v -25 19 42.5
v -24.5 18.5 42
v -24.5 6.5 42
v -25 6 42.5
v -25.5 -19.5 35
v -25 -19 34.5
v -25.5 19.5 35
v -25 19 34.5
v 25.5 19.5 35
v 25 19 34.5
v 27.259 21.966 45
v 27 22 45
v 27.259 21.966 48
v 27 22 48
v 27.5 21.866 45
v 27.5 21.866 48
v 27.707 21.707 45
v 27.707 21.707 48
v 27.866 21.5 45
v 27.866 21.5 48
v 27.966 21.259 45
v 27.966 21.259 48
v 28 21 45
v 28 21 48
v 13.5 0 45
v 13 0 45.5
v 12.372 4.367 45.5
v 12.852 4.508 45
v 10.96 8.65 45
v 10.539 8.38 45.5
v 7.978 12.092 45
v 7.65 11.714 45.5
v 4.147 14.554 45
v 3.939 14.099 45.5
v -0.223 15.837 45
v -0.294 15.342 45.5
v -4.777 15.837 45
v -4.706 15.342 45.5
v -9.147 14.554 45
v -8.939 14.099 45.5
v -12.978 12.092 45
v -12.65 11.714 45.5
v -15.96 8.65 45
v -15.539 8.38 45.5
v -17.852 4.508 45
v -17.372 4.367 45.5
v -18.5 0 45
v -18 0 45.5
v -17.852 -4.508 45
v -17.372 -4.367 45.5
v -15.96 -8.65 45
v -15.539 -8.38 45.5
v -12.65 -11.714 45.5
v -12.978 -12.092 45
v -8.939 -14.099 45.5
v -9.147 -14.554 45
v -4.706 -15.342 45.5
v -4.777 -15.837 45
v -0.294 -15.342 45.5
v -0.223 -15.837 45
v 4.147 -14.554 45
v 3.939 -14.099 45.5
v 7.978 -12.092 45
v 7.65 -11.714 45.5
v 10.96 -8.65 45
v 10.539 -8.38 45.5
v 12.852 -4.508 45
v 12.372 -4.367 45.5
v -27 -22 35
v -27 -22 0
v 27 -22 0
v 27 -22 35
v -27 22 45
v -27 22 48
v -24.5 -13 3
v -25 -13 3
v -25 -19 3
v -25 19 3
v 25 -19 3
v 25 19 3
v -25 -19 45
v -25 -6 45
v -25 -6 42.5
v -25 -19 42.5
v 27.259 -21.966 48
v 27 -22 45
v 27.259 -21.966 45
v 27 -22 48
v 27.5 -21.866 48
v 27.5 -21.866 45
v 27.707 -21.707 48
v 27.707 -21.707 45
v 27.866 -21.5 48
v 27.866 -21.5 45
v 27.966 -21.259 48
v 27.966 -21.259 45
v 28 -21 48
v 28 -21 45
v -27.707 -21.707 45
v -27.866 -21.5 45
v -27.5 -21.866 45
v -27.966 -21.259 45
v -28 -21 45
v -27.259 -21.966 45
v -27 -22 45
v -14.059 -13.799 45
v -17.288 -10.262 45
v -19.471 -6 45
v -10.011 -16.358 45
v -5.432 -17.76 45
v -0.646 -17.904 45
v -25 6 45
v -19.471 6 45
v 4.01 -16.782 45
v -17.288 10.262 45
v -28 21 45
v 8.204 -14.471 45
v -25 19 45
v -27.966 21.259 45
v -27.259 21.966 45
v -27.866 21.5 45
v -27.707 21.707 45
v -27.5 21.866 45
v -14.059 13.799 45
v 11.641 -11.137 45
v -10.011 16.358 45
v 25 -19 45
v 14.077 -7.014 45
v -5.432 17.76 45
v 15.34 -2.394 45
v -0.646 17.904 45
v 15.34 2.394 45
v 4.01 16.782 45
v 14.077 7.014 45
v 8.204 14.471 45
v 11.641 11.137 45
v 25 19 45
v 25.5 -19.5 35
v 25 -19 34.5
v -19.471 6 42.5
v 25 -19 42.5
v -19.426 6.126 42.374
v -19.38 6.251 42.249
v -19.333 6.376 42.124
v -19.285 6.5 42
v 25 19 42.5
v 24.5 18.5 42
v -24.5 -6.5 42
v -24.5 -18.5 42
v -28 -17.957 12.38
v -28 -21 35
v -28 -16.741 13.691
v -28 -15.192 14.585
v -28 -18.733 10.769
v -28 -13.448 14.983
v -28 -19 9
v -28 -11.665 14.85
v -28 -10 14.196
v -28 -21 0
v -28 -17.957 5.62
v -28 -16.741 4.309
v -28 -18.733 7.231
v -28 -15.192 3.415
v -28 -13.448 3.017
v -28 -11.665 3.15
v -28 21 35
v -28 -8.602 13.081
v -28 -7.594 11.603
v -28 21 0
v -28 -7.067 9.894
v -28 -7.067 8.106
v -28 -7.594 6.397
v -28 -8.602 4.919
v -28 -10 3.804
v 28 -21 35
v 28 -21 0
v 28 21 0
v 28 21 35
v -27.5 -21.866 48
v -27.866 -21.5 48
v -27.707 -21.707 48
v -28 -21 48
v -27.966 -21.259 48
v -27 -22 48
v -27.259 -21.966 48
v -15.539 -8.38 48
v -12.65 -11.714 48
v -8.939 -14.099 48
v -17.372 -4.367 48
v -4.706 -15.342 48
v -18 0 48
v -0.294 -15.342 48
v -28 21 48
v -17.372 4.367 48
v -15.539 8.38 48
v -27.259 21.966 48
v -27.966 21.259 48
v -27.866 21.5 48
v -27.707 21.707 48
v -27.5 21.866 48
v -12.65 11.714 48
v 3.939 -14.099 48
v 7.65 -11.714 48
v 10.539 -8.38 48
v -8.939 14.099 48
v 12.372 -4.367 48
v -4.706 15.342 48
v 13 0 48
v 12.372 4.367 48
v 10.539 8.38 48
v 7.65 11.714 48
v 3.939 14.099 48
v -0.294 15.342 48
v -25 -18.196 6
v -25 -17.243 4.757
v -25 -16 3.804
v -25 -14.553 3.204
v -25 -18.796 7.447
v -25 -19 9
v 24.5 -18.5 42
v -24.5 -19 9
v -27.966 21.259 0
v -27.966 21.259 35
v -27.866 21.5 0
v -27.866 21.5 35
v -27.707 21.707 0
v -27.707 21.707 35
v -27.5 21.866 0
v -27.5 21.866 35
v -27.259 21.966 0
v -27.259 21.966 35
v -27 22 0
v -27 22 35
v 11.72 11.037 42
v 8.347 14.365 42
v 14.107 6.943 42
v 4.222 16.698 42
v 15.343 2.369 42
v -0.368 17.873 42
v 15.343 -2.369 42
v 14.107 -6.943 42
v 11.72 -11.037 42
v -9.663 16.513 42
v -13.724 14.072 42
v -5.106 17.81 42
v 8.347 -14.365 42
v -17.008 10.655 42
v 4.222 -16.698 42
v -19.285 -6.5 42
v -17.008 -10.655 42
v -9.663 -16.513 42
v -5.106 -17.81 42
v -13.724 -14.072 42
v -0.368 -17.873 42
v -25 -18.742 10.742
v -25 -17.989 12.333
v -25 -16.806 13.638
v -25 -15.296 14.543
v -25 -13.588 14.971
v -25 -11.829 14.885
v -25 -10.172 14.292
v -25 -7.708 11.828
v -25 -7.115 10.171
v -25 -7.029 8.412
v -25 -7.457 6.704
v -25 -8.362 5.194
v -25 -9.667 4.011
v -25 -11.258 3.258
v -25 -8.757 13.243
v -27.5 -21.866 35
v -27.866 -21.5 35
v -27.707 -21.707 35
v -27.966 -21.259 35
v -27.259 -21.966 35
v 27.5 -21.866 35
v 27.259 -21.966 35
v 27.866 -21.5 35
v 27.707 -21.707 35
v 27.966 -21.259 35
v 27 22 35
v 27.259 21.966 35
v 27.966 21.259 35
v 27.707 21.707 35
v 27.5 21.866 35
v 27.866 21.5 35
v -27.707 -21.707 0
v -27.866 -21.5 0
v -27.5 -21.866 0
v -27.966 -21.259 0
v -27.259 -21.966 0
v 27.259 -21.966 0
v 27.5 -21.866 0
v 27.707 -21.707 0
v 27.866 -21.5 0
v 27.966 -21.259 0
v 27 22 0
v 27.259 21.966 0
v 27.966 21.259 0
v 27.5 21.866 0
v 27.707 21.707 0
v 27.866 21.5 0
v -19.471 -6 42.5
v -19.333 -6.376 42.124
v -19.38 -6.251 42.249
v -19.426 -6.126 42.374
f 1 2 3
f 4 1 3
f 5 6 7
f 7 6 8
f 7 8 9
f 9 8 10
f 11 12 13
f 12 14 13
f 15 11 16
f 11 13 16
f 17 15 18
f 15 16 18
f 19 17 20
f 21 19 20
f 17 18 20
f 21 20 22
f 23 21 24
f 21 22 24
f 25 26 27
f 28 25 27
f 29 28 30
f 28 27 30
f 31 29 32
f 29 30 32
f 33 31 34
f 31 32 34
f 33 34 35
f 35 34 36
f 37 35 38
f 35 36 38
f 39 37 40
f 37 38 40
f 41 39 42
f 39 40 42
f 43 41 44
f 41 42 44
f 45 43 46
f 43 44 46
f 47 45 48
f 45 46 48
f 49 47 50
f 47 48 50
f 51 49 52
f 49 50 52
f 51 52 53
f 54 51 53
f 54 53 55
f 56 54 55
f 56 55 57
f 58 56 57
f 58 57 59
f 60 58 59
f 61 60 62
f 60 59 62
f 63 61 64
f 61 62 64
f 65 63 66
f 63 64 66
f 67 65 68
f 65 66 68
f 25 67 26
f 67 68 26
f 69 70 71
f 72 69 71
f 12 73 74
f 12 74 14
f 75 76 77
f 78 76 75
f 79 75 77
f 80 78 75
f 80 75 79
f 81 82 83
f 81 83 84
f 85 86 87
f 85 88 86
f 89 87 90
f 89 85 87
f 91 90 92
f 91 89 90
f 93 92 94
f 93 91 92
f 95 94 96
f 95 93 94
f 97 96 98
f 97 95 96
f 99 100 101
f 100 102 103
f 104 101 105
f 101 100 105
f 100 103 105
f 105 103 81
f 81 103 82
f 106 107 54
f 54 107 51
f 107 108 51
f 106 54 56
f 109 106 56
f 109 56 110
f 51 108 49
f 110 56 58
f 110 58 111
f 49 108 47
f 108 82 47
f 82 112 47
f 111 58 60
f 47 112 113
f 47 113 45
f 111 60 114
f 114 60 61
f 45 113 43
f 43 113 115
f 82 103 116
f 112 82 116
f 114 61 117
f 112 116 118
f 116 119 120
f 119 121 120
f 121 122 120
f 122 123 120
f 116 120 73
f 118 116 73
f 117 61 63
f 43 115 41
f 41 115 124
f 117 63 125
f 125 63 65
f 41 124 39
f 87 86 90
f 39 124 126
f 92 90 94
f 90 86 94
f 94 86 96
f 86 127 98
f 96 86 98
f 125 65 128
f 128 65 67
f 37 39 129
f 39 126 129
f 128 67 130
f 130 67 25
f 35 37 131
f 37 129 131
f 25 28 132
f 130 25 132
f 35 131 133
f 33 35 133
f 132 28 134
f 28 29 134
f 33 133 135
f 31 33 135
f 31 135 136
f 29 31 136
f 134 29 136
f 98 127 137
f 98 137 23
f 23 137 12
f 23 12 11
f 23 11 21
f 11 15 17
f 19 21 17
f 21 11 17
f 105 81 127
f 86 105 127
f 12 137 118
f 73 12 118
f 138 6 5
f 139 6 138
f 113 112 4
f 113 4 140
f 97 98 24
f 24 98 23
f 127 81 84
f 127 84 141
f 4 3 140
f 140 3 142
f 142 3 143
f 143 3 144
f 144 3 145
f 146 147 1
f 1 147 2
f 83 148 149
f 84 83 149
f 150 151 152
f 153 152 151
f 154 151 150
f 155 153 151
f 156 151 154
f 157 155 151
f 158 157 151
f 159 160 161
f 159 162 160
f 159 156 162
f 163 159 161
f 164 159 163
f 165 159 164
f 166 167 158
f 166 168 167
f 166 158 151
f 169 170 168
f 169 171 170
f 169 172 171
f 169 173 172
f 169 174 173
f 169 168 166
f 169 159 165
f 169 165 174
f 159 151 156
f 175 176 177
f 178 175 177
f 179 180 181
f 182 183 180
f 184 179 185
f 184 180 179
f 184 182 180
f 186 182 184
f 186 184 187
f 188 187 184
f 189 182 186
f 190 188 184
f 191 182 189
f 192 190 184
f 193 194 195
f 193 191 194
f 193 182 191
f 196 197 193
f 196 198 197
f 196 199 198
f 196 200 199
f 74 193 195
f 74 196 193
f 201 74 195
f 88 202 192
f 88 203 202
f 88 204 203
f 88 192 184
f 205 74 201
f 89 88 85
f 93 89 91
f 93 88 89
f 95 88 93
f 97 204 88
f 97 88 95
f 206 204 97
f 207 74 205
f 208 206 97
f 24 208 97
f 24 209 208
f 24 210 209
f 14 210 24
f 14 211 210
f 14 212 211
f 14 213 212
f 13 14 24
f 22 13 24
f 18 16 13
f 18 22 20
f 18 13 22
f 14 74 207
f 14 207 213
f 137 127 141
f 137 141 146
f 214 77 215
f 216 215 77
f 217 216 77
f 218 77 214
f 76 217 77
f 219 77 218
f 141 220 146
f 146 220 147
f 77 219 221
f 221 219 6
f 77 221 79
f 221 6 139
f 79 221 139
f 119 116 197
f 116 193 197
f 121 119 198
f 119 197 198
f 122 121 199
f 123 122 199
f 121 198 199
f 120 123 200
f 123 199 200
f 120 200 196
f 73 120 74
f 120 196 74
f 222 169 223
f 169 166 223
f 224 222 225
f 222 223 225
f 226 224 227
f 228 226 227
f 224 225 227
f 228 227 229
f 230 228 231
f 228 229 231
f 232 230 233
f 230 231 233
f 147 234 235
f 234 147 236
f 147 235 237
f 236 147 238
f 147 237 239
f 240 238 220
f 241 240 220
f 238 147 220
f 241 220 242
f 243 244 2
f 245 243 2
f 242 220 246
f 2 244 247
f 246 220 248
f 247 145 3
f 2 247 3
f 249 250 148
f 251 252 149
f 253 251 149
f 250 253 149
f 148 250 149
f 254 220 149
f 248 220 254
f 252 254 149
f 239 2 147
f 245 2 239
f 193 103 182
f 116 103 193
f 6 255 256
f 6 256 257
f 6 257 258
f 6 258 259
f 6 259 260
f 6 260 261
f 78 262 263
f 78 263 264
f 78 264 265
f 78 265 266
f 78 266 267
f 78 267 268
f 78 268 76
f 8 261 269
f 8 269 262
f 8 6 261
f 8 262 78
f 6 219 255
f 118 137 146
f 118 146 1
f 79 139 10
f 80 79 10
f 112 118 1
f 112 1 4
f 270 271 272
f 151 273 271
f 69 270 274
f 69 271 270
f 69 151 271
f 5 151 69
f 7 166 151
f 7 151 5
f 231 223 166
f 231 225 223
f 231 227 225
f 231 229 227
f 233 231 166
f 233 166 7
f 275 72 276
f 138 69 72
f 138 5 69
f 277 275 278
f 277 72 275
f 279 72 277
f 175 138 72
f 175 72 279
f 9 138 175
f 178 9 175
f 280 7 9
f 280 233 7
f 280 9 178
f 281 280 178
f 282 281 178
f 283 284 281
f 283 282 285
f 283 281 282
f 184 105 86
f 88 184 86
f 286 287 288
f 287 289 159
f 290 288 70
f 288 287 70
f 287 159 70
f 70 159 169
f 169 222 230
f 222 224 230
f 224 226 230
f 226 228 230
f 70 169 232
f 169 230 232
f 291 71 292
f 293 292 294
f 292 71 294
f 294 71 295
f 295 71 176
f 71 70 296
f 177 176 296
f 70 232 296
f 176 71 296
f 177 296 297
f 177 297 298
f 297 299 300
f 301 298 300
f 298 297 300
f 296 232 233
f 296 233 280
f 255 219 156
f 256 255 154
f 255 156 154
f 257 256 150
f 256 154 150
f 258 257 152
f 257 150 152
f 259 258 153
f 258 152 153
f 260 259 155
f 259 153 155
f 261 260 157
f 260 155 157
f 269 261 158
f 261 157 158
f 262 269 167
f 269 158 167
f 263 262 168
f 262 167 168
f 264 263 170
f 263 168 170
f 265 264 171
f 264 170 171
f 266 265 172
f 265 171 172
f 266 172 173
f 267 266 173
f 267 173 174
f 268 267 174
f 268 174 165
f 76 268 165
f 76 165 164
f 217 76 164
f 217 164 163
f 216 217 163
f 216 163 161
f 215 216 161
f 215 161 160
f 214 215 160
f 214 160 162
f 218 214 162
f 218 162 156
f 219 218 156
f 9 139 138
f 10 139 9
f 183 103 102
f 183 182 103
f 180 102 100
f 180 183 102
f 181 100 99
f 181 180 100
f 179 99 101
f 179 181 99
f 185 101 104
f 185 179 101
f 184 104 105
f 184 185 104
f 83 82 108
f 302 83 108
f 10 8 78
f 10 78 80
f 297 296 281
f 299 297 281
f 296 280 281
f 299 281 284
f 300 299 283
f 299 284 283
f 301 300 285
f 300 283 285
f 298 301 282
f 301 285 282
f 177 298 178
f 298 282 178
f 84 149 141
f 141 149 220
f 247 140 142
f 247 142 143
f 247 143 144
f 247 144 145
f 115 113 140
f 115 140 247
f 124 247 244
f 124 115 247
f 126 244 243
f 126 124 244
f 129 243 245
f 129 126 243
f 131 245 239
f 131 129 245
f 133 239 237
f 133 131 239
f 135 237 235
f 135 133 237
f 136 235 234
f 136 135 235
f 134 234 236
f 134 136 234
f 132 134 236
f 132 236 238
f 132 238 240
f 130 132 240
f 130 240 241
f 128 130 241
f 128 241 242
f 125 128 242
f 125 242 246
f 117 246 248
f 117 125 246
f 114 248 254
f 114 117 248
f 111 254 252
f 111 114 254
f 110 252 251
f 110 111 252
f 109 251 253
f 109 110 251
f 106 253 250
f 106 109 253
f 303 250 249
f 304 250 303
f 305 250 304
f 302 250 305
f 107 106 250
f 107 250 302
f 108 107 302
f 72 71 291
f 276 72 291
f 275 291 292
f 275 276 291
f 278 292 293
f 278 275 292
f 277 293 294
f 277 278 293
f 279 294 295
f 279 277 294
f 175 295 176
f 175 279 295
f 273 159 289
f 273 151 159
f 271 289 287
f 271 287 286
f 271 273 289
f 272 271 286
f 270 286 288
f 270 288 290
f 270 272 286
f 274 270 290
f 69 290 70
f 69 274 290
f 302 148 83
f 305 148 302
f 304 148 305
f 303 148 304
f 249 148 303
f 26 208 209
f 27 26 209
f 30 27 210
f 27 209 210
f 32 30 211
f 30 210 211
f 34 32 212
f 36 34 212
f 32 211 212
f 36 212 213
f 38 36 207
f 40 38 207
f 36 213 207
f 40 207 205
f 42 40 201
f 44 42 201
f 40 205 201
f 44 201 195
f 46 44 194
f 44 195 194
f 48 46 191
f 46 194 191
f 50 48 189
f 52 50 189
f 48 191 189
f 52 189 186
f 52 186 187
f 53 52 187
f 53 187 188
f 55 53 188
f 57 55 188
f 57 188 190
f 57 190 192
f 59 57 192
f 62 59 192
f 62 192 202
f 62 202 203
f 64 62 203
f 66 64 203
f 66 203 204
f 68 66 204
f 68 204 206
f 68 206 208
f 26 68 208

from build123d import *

# Parameters (mm, degrees)
SKETCH_W        = 56
SKETCH_H        = 44
PAD_DEPTH       = 35
SKETCH001_W     = 50
SKETCH001_H     = 38
POCKET_DEPTH    = 32
CHAMFER_SIZE    = 0.5
SKETCH002_R     = 6
POCKET002_DEPTH = 3.5
FILLET_R        = 1
SKETCH003_W     = 56
SKETCH003_H     = 44
PAD001_DEPTH    = 3
PAD002_DEPTH    = 3
CHAMFER001_SIZE = 0.5
SKETCH005_R     = 15.5
POCKET001_DEPTH = 6.001
CHAMFER002_SIZE = 0.5
CHAMFER003_SIZE = 0.5
FILLET001_R     = 1


with BuildPart() as enclosure:
    # Sketch → Pad (new body)
    with BuildSketch(Plane.XY):
        Rectangle(SKETCH_W, SKETCH_H)
    extrude(amount=PAD_DEPTH)

    # Sketch001 (on Face6 of Pad) → Pocket (cut)
    with BuildSketch(Plane.XY.offset(35)):
        Rectangle(SKETCH001_W, SKETCH001_H)
    extrude(amount=-POCKET_DEPTH, mode=Mode.SUBTRACT)

    # Chamfer
    chamfer_edges = [enclosure.edges().sort_by_distance(p)[0] for p in [
        (0, 19, 35),
        (-25, 0, 35),
        (0, -19, 35),
        (25, 0, 35),
    ]]
    chamfer(chamfer_edges, length=CHAMFER_SIZE)

    # Sketch002 (on Face2 of Pocket) → Pocket002 (cut)
    with BuildSketch(Plane(origin=(-28, 0, 0), x_dir=(0, -1, 0), z_dir=(-1, 0, 0))):
        with Locations((13, 9)):
            Circle(SKETCH002_R)
    extrude(amount=-POCKET002_DEPTH, mode=Mode.SUBTRACT)

    # Fillet
    fillet_edges = [enclosure.edges().sort_by_distance(p)[0] for p in [
        (-28, 22, 17.5),
        (28, 22, 17.5),
        (28, -22, 17.5),
        (-28, -22, 17.5),
    ]]
    fillet(fillet_edges, radius=FILLET_R)


with BuildPart() as lid:
    # Sketch003 (on DatumPlane) → Pad001 (new body)
    with BuildSketch(Plane.XY.offset(45)):
        Rectangle(SKETCH003_W, SKETCH003_H)
    extrude(amount=PAD001_DEPTH)

    # Sketch004 (on Face5 of Pad001) → Pad002 (join)
    with BuildSketch(Plane(origin=(0, 0, 45), x_dir=(1, 0, 0), z_dir=(0, 0, -1))):
        with BuildLine():
            Line((-25, 19), (25, 19))
            Line((25, 19), (25, -19))
            Line((25, -19), (-25, -19))
            Line((-25, -19), (-25, -6))
            Line((-25, -6), (-19.470563, -6))
            ThreePointArc((-19.470563, -6), (15.5, 0), (-19.470563, 6))
            Line((-25, 6), (-19.470563, 6))
            Line((-25, 6), (-25, 19))
        make_face()
    extrude(amount=PAD002_DEPTH)

    # Chamfer001
    chamfer001_edges = [lid.edges().sort_by_distance(p)[0] for p in [
        (0, -19, 42),
        (-25, -12.5, 42),
        (-25, 12.5, 42),
        (0, 19, 42),
        (25, 0, 42),
    ]]
    chamfer(chamfer001_edges, length=CHAMFER001_SIZE)

    # Sketch005 (on Face5 of Pad002) → Pocket001 (cut, through all)
    with BuildSketch(Plane.XY.offset(48)):
        with Locations((-2.5, 0)):
            Circle(SKETCH005_R)
    extrude(amount=-POCKET001_DEPTH, mode=Mode.SUBTRACT)

    # Chamfer002
    chamfer002_edges = [lid.edges().sort_by_distance(p)[0] for p in [
        (-18, 0, 45),
    ]]
    chamfer(chamfer002_edges, length=CHAMFER002_SIZE)

    # Chamfer003
    chamfer003_edges = [lid.edges().sort_by_distance(p)[0] for p in [
        (-21.985281, 6, 42),
        (-21.985281, -6, 42),
    ]]
    chamfer(chamfer003_edges, length=CHAMFER003_SIZE)

    # Fillet001
    fillet001_edges = [lid.edges().sort_by_distance(p)[0] for p in [
        (28, -22, 46.5),
        (28, 22, 46.5),
        (-28, 22, 46.5),
        (-28, -22, 46.5),
    ]]
    fillet(fillet001_edges, radius=FILLET001_R)


solid = Compound([enclosure.part, lid.part])
